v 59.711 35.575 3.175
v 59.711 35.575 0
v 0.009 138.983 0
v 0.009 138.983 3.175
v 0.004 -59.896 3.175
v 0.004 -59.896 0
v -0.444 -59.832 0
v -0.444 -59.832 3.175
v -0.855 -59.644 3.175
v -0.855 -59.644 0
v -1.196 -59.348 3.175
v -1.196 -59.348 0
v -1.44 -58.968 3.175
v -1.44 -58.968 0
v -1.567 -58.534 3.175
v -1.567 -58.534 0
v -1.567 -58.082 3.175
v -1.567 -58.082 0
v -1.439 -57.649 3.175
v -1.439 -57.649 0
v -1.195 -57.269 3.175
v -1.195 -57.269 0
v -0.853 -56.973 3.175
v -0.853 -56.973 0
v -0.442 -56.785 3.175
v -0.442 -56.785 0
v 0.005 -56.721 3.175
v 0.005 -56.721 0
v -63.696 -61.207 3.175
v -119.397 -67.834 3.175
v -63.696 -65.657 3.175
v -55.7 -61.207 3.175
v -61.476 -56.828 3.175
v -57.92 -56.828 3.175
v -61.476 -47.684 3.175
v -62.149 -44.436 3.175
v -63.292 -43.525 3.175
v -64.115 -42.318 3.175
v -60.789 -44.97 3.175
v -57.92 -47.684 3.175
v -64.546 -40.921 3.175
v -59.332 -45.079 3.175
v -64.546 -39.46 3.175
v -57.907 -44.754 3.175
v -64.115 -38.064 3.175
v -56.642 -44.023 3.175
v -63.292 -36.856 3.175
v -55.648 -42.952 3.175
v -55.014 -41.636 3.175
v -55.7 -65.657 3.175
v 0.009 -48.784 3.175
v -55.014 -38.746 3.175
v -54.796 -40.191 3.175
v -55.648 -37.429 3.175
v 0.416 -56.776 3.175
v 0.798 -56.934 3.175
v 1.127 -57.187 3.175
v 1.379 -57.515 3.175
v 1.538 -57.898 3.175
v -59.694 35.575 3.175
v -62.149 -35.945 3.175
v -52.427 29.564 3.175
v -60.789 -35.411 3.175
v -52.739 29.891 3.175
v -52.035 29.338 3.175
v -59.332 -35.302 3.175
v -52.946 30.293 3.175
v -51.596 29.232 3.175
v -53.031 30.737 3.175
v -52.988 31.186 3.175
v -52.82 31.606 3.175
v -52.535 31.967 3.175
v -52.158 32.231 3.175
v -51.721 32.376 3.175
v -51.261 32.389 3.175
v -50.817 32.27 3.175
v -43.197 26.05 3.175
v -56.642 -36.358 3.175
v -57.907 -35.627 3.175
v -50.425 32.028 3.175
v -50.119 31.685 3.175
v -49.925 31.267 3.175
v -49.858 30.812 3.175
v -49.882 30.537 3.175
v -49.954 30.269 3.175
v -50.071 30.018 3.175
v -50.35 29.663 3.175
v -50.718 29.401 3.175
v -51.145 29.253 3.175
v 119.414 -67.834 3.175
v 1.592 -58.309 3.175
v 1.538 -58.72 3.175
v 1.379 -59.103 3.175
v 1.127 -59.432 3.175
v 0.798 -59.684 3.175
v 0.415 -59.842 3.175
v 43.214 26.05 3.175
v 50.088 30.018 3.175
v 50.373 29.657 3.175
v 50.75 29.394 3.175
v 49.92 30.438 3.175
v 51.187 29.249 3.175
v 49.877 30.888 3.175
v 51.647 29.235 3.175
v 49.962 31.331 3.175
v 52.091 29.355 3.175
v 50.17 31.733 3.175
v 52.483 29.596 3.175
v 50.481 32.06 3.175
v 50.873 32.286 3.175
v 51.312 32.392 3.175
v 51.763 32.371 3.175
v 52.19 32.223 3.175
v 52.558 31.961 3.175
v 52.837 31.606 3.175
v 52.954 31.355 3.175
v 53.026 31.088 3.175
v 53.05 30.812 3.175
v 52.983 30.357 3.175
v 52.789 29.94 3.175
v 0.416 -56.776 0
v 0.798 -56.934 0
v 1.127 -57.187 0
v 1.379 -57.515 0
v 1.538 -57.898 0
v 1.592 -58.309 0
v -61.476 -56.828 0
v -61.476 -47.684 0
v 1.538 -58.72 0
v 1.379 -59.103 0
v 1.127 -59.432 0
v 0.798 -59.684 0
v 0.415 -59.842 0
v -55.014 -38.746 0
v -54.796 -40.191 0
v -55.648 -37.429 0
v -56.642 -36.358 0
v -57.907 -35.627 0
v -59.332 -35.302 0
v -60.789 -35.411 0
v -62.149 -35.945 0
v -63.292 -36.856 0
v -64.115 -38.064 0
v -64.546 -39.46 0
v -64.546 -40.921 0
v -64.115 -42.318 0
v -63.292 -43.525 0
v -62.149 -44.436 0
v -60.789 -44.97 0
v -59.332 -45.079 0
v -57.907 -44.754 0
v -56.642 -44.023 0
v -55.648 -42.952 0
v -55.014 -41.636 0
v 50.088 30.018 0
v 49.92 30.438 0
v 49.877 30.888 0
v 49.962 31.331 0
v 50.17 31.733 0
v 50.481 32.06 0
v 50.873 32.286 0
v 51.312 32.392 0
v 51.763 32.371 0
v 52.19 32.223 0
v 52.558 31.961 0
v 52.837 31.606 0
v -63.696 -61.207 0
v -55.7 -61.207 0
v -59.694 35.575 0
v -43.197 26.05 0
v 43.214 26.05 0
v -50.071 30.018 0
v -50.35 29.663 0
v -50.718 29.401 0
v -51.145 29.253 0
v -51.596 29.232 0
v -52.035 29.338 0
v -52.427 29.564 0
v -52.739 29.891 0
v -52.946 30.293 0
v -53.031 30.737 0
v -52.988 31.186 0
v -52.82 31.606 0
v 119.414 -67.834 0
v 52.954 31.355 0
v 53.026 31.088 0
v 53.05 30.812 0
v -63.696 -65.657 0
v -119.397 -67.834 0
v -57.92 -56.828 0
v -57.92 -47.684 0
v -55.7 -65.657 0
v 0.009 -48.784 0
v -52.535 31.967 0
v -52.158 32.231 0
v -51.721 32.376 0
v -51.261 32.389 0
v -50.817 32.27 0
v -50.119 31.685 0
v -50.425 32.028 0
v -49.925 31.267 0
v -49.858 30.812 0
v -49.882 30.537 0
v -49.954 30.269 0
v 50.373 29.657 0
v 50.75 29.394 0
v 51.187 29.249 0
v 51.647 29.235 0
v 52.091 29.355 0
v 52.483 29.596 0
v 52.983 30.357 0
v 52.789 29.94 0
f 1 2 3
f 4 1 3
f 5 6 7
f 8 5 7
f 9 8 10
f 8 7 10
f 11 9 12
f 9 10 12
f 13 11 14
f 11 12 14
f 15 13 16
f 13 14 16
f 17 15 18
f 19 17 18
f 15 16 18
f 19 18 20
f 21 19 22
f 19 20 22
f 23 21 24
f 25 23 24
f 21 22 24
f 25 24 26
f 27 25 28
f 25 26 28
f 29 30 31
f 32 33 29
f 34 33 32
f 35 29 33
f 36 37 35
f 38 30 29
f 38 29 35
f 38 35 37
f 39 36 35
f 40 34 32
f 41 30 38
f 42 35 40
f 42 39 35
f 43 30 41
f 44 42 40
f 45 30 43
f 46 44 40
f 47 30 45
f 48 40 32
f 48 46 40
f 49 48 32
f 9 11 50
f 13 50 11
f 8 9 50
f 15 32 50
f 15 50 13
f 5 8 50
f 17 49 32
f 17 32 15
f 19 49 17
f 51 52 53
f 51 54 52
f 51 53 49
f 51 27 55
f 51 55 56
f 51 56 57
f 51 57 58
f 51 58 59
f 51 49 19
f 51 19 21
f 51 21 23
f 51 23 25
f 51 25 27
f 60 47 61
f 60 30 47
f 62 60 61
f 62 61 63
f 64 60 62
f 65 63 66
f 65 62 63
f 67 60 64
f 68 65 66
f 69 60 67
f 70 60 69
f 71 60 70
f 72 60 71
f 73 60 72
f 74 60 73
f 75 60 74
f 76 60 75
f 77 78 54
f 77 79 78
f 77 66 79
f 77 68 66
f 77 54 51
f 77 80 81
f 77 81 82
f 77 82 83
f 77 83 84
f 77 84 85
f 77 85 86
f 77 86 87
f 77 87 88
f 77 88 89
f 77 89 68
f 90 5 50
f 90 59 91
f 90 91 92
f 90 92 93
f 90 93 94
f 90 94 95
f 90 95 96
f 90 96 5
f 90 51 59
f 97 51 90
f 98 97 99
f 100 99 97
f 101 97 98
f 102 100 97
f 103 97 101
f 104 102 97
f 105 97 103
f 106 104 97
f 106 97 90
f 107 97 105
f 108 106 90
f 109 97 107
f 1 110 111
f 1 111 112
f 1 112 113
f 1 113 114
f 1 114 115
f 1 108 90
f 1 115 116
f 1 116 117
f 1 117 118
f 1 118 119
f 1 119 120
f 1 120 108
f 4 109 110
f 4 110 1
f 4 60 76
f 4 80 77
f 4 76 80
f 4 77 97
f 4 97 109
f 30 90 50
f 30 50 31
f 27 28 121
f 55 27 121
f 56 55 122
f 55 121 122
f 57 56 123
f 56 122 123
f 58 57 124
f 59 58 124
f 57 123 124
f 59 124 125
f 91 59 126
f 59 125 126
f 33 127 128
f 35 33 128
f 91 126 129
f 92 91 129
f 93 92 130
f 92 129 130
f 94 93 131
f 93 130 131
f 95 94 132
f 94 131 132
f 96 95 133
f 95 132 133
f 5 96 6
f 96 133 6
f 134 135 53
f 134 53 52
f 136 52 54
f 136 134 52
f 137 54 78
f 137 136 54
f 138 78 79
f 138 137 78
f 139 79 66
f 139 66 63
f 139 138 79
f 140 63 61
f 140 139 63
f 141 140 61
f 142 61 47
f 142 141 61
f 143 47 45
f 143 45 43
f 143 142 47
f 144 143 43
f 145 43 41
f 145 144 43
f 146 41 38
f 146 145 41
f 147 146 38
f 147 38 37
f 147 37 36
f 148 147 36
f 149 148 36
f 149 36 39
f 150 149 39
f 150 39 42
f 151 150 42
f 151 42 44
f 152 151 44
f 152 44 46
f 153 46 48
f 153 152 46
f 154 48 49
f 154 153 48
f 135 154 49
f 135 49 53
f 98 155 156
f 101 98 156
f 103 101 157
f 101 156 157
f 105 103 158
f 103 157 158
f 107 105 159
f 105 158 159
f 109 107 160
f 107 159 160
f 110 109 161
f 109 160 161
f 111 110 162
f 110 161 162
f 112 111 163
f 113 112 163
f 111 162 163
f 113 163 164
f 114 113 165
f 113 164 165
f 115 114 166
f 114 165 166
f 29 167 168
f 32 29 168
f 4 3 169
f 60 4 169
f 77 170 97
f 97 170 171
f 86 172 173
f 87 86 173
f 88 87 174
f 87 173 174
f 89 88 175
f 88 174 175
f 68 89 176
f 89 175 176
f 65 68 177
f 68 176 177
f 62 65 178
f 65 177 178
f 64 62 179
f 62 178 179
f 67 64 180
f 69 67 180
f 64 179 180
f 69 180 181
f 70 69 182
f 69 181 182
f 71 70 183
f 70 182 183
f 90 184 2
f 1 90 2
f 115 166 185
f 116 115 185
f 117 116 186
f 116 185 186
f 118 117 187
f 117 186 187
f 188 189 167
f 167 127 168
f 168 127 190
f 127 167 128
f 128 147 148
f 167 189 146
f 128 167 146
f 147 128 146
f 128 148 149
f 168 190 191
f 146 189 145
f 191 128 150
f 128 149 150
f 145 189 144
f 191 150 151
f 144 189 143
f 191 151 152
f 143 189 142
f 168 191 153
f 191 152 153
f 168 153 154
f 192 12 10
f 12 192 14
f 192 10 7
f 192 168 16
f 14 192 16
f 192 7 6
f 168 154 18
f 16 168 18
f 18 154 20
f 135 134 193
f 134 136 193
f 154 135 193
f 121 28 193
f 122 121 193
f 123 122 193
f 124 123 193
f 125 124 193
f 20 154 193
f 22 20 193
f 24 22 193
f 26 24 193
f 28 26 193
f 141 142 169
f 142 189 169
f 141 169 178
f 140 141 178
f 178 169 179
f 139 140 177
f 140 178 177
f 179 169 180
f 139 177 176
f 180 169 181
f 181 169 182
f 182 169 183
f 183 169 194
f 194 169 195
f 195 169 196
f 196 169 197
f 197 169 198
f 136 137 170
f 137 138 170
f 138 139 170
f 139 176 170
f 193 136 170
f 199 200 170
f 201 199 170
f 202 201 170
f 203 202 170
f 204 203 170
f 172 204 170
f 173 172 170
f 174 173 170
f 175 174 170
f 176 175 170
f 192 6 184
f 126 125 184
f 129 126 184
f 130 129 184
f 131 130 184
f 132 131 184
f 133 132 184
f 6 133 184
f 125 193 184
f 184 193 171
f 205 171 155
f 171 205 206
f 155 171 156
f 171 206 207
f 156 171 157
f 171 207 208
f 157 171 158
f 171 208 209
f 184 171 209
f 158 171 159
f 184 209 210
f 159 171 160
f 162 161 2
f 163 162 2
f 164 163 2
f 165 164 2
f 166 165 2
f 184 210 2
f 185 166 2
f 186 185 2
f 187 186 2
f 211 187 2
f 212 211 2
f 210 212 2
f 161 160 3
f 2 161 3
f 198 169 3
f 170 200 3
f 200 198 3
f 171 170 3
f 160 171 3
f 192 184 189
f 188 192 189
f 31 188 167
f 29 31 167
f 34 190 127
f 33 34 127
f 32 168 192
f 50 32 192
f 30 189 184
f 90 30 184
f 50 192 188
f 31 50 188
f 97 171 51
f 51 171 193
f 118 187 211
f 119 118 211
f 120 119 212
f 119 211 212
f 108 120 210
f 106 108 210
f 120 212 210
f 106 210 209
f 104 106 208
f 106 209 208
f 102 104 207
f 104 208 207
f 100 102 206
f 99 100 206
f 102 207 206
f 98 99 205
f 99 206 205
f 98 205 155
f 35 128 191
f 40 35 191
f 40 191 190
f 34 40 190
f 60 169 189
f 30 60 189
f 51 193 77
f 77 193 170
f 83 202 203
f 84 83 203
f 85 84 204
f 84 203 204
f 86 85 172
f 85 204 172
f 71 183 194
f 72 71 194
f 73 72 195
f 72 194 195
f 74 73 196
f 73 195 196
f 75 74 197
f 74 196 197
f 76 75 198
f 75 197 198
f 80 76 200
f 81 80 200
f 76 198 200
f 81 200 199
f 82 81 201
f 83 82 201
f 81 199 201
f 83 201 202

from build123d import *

# Parameters (mm, degrees)
F0_R     = 4.9022
F1_DEPTH = 3.175


with BuildPart() as f1:
    # F0 (on Top) → F1 (new body)
    with BuildSketch(Plane.XY):
        with BuildLine():
            Line((43.214022, 26.049825), (0.008622, -48.784123))
            Line((0.008622, -48.784123), (0.005029, -56.721344))
            ThreePointArc((0.005029, -56.721344), (1.127097, -57.186566), (1.591811, -58.308844))
            ThreePointArc((1.591811, -58.308844), (1.126589, -59.43163), (0.003592, -59.896344))
            Line((0.003592, -59.896344), (0, -67.833564))
            Line((0, -67.833564), (119.414022, -67.833564))
            Line((119.414022, -67.833564), (59.711322, 35.574545))
            Line((59.711322, 35.574545), (52.837487, 31.605935))
            ThreePointArc((52.837487, 31.605935), (52.996079, 31.22306), (53.050172, 30.812185))
            ThreePointArc((53.050172, 30.812185), (51.873547, 29.278778), (50.087856, 30.018435))
            Line((50.087856, 30.018435), (43.214022, 26.049825))
        make_face()
        with BuildLine():
            Line((-50.070613, 30.018435), (-43.196778, 26.049825))
            Line((-43.196778, 26.049825), (43.214022, 26.049825))
            Line((43.214022, 26.049825), (50.087856, 30.018435))
            ThreePointArc((50.087856, 30.018435), (50.668922, 32.187), (52.837487, 31.605935))
            Line((52.837487, 31.605935), (59.711322, 35.574545))
            Line((59.711322, 35.574545), (0.008622, 138.982655))
            Line((0.008622, 138.982655), (-59.694078, 35.574545))
            Line((-59.694078, 35.574545), (-52.820244, 31.605935))
            ThreePointArc((-52.820244, 31.605935), (-51.034553, 32.345592), (-49.857928, 30.812185))
            ThreePointArc((-49.857928, 30.812185), (-49.912021, 30.40131), (-50.070613, 30.018435))
        make_face()
        with BuildLine():
            Line((0.008622, -48.784123), (-43.196778, 26.049825))
            Line((-43.196778, 26.049825), (-50.070613, 30.018435))
            ThreePointArc((-50.070613, 30.018435), (-52.239178, 29.43737), (-52.820244, 31.605935))
            Line((-52.820244, 31.605935), (-59.694078, 35.574545))
            Line((-59.694078, 35.574545), (-119.396778, -67.833564))
            Line((-119.396778, -67.833564), (0, -67.833564))
            Line((0, -67.833564), (0.003592, -59.896344))
            ThreePointArc((0.003592, -59.896344), (-1.583189, -58.308125), (0.005029, -56.721344))
            Line((0.005029, -56.721344), (0.008622, -48.784123))
        make_face()
        Polygon((-63.696348, -65.656609), (-63.696348, -63.431569), (-63.696348, -61.206529), (-55.700428, -61.206529), (-55.700428, -63.431569), (-55.700428, -65.656609), align=None, mode=Mode.SUBTRACT)
        Polygon((-61.476388, -56.827569), (-61.476388, -52.255569), (-61.476388, -47.683569), (-57.920388, -47.683569), (-57.920388, -52.255569), (-57.920388, -56.827569), align=None, mode=Mode.SUBTRACT)
        with Locations((-59.698388, -40.190569)):
            Circle(F0_R, mode=Mode.SUBTRACT)
    extrude(amount=F1_DEPTH)


solid = f1.part
